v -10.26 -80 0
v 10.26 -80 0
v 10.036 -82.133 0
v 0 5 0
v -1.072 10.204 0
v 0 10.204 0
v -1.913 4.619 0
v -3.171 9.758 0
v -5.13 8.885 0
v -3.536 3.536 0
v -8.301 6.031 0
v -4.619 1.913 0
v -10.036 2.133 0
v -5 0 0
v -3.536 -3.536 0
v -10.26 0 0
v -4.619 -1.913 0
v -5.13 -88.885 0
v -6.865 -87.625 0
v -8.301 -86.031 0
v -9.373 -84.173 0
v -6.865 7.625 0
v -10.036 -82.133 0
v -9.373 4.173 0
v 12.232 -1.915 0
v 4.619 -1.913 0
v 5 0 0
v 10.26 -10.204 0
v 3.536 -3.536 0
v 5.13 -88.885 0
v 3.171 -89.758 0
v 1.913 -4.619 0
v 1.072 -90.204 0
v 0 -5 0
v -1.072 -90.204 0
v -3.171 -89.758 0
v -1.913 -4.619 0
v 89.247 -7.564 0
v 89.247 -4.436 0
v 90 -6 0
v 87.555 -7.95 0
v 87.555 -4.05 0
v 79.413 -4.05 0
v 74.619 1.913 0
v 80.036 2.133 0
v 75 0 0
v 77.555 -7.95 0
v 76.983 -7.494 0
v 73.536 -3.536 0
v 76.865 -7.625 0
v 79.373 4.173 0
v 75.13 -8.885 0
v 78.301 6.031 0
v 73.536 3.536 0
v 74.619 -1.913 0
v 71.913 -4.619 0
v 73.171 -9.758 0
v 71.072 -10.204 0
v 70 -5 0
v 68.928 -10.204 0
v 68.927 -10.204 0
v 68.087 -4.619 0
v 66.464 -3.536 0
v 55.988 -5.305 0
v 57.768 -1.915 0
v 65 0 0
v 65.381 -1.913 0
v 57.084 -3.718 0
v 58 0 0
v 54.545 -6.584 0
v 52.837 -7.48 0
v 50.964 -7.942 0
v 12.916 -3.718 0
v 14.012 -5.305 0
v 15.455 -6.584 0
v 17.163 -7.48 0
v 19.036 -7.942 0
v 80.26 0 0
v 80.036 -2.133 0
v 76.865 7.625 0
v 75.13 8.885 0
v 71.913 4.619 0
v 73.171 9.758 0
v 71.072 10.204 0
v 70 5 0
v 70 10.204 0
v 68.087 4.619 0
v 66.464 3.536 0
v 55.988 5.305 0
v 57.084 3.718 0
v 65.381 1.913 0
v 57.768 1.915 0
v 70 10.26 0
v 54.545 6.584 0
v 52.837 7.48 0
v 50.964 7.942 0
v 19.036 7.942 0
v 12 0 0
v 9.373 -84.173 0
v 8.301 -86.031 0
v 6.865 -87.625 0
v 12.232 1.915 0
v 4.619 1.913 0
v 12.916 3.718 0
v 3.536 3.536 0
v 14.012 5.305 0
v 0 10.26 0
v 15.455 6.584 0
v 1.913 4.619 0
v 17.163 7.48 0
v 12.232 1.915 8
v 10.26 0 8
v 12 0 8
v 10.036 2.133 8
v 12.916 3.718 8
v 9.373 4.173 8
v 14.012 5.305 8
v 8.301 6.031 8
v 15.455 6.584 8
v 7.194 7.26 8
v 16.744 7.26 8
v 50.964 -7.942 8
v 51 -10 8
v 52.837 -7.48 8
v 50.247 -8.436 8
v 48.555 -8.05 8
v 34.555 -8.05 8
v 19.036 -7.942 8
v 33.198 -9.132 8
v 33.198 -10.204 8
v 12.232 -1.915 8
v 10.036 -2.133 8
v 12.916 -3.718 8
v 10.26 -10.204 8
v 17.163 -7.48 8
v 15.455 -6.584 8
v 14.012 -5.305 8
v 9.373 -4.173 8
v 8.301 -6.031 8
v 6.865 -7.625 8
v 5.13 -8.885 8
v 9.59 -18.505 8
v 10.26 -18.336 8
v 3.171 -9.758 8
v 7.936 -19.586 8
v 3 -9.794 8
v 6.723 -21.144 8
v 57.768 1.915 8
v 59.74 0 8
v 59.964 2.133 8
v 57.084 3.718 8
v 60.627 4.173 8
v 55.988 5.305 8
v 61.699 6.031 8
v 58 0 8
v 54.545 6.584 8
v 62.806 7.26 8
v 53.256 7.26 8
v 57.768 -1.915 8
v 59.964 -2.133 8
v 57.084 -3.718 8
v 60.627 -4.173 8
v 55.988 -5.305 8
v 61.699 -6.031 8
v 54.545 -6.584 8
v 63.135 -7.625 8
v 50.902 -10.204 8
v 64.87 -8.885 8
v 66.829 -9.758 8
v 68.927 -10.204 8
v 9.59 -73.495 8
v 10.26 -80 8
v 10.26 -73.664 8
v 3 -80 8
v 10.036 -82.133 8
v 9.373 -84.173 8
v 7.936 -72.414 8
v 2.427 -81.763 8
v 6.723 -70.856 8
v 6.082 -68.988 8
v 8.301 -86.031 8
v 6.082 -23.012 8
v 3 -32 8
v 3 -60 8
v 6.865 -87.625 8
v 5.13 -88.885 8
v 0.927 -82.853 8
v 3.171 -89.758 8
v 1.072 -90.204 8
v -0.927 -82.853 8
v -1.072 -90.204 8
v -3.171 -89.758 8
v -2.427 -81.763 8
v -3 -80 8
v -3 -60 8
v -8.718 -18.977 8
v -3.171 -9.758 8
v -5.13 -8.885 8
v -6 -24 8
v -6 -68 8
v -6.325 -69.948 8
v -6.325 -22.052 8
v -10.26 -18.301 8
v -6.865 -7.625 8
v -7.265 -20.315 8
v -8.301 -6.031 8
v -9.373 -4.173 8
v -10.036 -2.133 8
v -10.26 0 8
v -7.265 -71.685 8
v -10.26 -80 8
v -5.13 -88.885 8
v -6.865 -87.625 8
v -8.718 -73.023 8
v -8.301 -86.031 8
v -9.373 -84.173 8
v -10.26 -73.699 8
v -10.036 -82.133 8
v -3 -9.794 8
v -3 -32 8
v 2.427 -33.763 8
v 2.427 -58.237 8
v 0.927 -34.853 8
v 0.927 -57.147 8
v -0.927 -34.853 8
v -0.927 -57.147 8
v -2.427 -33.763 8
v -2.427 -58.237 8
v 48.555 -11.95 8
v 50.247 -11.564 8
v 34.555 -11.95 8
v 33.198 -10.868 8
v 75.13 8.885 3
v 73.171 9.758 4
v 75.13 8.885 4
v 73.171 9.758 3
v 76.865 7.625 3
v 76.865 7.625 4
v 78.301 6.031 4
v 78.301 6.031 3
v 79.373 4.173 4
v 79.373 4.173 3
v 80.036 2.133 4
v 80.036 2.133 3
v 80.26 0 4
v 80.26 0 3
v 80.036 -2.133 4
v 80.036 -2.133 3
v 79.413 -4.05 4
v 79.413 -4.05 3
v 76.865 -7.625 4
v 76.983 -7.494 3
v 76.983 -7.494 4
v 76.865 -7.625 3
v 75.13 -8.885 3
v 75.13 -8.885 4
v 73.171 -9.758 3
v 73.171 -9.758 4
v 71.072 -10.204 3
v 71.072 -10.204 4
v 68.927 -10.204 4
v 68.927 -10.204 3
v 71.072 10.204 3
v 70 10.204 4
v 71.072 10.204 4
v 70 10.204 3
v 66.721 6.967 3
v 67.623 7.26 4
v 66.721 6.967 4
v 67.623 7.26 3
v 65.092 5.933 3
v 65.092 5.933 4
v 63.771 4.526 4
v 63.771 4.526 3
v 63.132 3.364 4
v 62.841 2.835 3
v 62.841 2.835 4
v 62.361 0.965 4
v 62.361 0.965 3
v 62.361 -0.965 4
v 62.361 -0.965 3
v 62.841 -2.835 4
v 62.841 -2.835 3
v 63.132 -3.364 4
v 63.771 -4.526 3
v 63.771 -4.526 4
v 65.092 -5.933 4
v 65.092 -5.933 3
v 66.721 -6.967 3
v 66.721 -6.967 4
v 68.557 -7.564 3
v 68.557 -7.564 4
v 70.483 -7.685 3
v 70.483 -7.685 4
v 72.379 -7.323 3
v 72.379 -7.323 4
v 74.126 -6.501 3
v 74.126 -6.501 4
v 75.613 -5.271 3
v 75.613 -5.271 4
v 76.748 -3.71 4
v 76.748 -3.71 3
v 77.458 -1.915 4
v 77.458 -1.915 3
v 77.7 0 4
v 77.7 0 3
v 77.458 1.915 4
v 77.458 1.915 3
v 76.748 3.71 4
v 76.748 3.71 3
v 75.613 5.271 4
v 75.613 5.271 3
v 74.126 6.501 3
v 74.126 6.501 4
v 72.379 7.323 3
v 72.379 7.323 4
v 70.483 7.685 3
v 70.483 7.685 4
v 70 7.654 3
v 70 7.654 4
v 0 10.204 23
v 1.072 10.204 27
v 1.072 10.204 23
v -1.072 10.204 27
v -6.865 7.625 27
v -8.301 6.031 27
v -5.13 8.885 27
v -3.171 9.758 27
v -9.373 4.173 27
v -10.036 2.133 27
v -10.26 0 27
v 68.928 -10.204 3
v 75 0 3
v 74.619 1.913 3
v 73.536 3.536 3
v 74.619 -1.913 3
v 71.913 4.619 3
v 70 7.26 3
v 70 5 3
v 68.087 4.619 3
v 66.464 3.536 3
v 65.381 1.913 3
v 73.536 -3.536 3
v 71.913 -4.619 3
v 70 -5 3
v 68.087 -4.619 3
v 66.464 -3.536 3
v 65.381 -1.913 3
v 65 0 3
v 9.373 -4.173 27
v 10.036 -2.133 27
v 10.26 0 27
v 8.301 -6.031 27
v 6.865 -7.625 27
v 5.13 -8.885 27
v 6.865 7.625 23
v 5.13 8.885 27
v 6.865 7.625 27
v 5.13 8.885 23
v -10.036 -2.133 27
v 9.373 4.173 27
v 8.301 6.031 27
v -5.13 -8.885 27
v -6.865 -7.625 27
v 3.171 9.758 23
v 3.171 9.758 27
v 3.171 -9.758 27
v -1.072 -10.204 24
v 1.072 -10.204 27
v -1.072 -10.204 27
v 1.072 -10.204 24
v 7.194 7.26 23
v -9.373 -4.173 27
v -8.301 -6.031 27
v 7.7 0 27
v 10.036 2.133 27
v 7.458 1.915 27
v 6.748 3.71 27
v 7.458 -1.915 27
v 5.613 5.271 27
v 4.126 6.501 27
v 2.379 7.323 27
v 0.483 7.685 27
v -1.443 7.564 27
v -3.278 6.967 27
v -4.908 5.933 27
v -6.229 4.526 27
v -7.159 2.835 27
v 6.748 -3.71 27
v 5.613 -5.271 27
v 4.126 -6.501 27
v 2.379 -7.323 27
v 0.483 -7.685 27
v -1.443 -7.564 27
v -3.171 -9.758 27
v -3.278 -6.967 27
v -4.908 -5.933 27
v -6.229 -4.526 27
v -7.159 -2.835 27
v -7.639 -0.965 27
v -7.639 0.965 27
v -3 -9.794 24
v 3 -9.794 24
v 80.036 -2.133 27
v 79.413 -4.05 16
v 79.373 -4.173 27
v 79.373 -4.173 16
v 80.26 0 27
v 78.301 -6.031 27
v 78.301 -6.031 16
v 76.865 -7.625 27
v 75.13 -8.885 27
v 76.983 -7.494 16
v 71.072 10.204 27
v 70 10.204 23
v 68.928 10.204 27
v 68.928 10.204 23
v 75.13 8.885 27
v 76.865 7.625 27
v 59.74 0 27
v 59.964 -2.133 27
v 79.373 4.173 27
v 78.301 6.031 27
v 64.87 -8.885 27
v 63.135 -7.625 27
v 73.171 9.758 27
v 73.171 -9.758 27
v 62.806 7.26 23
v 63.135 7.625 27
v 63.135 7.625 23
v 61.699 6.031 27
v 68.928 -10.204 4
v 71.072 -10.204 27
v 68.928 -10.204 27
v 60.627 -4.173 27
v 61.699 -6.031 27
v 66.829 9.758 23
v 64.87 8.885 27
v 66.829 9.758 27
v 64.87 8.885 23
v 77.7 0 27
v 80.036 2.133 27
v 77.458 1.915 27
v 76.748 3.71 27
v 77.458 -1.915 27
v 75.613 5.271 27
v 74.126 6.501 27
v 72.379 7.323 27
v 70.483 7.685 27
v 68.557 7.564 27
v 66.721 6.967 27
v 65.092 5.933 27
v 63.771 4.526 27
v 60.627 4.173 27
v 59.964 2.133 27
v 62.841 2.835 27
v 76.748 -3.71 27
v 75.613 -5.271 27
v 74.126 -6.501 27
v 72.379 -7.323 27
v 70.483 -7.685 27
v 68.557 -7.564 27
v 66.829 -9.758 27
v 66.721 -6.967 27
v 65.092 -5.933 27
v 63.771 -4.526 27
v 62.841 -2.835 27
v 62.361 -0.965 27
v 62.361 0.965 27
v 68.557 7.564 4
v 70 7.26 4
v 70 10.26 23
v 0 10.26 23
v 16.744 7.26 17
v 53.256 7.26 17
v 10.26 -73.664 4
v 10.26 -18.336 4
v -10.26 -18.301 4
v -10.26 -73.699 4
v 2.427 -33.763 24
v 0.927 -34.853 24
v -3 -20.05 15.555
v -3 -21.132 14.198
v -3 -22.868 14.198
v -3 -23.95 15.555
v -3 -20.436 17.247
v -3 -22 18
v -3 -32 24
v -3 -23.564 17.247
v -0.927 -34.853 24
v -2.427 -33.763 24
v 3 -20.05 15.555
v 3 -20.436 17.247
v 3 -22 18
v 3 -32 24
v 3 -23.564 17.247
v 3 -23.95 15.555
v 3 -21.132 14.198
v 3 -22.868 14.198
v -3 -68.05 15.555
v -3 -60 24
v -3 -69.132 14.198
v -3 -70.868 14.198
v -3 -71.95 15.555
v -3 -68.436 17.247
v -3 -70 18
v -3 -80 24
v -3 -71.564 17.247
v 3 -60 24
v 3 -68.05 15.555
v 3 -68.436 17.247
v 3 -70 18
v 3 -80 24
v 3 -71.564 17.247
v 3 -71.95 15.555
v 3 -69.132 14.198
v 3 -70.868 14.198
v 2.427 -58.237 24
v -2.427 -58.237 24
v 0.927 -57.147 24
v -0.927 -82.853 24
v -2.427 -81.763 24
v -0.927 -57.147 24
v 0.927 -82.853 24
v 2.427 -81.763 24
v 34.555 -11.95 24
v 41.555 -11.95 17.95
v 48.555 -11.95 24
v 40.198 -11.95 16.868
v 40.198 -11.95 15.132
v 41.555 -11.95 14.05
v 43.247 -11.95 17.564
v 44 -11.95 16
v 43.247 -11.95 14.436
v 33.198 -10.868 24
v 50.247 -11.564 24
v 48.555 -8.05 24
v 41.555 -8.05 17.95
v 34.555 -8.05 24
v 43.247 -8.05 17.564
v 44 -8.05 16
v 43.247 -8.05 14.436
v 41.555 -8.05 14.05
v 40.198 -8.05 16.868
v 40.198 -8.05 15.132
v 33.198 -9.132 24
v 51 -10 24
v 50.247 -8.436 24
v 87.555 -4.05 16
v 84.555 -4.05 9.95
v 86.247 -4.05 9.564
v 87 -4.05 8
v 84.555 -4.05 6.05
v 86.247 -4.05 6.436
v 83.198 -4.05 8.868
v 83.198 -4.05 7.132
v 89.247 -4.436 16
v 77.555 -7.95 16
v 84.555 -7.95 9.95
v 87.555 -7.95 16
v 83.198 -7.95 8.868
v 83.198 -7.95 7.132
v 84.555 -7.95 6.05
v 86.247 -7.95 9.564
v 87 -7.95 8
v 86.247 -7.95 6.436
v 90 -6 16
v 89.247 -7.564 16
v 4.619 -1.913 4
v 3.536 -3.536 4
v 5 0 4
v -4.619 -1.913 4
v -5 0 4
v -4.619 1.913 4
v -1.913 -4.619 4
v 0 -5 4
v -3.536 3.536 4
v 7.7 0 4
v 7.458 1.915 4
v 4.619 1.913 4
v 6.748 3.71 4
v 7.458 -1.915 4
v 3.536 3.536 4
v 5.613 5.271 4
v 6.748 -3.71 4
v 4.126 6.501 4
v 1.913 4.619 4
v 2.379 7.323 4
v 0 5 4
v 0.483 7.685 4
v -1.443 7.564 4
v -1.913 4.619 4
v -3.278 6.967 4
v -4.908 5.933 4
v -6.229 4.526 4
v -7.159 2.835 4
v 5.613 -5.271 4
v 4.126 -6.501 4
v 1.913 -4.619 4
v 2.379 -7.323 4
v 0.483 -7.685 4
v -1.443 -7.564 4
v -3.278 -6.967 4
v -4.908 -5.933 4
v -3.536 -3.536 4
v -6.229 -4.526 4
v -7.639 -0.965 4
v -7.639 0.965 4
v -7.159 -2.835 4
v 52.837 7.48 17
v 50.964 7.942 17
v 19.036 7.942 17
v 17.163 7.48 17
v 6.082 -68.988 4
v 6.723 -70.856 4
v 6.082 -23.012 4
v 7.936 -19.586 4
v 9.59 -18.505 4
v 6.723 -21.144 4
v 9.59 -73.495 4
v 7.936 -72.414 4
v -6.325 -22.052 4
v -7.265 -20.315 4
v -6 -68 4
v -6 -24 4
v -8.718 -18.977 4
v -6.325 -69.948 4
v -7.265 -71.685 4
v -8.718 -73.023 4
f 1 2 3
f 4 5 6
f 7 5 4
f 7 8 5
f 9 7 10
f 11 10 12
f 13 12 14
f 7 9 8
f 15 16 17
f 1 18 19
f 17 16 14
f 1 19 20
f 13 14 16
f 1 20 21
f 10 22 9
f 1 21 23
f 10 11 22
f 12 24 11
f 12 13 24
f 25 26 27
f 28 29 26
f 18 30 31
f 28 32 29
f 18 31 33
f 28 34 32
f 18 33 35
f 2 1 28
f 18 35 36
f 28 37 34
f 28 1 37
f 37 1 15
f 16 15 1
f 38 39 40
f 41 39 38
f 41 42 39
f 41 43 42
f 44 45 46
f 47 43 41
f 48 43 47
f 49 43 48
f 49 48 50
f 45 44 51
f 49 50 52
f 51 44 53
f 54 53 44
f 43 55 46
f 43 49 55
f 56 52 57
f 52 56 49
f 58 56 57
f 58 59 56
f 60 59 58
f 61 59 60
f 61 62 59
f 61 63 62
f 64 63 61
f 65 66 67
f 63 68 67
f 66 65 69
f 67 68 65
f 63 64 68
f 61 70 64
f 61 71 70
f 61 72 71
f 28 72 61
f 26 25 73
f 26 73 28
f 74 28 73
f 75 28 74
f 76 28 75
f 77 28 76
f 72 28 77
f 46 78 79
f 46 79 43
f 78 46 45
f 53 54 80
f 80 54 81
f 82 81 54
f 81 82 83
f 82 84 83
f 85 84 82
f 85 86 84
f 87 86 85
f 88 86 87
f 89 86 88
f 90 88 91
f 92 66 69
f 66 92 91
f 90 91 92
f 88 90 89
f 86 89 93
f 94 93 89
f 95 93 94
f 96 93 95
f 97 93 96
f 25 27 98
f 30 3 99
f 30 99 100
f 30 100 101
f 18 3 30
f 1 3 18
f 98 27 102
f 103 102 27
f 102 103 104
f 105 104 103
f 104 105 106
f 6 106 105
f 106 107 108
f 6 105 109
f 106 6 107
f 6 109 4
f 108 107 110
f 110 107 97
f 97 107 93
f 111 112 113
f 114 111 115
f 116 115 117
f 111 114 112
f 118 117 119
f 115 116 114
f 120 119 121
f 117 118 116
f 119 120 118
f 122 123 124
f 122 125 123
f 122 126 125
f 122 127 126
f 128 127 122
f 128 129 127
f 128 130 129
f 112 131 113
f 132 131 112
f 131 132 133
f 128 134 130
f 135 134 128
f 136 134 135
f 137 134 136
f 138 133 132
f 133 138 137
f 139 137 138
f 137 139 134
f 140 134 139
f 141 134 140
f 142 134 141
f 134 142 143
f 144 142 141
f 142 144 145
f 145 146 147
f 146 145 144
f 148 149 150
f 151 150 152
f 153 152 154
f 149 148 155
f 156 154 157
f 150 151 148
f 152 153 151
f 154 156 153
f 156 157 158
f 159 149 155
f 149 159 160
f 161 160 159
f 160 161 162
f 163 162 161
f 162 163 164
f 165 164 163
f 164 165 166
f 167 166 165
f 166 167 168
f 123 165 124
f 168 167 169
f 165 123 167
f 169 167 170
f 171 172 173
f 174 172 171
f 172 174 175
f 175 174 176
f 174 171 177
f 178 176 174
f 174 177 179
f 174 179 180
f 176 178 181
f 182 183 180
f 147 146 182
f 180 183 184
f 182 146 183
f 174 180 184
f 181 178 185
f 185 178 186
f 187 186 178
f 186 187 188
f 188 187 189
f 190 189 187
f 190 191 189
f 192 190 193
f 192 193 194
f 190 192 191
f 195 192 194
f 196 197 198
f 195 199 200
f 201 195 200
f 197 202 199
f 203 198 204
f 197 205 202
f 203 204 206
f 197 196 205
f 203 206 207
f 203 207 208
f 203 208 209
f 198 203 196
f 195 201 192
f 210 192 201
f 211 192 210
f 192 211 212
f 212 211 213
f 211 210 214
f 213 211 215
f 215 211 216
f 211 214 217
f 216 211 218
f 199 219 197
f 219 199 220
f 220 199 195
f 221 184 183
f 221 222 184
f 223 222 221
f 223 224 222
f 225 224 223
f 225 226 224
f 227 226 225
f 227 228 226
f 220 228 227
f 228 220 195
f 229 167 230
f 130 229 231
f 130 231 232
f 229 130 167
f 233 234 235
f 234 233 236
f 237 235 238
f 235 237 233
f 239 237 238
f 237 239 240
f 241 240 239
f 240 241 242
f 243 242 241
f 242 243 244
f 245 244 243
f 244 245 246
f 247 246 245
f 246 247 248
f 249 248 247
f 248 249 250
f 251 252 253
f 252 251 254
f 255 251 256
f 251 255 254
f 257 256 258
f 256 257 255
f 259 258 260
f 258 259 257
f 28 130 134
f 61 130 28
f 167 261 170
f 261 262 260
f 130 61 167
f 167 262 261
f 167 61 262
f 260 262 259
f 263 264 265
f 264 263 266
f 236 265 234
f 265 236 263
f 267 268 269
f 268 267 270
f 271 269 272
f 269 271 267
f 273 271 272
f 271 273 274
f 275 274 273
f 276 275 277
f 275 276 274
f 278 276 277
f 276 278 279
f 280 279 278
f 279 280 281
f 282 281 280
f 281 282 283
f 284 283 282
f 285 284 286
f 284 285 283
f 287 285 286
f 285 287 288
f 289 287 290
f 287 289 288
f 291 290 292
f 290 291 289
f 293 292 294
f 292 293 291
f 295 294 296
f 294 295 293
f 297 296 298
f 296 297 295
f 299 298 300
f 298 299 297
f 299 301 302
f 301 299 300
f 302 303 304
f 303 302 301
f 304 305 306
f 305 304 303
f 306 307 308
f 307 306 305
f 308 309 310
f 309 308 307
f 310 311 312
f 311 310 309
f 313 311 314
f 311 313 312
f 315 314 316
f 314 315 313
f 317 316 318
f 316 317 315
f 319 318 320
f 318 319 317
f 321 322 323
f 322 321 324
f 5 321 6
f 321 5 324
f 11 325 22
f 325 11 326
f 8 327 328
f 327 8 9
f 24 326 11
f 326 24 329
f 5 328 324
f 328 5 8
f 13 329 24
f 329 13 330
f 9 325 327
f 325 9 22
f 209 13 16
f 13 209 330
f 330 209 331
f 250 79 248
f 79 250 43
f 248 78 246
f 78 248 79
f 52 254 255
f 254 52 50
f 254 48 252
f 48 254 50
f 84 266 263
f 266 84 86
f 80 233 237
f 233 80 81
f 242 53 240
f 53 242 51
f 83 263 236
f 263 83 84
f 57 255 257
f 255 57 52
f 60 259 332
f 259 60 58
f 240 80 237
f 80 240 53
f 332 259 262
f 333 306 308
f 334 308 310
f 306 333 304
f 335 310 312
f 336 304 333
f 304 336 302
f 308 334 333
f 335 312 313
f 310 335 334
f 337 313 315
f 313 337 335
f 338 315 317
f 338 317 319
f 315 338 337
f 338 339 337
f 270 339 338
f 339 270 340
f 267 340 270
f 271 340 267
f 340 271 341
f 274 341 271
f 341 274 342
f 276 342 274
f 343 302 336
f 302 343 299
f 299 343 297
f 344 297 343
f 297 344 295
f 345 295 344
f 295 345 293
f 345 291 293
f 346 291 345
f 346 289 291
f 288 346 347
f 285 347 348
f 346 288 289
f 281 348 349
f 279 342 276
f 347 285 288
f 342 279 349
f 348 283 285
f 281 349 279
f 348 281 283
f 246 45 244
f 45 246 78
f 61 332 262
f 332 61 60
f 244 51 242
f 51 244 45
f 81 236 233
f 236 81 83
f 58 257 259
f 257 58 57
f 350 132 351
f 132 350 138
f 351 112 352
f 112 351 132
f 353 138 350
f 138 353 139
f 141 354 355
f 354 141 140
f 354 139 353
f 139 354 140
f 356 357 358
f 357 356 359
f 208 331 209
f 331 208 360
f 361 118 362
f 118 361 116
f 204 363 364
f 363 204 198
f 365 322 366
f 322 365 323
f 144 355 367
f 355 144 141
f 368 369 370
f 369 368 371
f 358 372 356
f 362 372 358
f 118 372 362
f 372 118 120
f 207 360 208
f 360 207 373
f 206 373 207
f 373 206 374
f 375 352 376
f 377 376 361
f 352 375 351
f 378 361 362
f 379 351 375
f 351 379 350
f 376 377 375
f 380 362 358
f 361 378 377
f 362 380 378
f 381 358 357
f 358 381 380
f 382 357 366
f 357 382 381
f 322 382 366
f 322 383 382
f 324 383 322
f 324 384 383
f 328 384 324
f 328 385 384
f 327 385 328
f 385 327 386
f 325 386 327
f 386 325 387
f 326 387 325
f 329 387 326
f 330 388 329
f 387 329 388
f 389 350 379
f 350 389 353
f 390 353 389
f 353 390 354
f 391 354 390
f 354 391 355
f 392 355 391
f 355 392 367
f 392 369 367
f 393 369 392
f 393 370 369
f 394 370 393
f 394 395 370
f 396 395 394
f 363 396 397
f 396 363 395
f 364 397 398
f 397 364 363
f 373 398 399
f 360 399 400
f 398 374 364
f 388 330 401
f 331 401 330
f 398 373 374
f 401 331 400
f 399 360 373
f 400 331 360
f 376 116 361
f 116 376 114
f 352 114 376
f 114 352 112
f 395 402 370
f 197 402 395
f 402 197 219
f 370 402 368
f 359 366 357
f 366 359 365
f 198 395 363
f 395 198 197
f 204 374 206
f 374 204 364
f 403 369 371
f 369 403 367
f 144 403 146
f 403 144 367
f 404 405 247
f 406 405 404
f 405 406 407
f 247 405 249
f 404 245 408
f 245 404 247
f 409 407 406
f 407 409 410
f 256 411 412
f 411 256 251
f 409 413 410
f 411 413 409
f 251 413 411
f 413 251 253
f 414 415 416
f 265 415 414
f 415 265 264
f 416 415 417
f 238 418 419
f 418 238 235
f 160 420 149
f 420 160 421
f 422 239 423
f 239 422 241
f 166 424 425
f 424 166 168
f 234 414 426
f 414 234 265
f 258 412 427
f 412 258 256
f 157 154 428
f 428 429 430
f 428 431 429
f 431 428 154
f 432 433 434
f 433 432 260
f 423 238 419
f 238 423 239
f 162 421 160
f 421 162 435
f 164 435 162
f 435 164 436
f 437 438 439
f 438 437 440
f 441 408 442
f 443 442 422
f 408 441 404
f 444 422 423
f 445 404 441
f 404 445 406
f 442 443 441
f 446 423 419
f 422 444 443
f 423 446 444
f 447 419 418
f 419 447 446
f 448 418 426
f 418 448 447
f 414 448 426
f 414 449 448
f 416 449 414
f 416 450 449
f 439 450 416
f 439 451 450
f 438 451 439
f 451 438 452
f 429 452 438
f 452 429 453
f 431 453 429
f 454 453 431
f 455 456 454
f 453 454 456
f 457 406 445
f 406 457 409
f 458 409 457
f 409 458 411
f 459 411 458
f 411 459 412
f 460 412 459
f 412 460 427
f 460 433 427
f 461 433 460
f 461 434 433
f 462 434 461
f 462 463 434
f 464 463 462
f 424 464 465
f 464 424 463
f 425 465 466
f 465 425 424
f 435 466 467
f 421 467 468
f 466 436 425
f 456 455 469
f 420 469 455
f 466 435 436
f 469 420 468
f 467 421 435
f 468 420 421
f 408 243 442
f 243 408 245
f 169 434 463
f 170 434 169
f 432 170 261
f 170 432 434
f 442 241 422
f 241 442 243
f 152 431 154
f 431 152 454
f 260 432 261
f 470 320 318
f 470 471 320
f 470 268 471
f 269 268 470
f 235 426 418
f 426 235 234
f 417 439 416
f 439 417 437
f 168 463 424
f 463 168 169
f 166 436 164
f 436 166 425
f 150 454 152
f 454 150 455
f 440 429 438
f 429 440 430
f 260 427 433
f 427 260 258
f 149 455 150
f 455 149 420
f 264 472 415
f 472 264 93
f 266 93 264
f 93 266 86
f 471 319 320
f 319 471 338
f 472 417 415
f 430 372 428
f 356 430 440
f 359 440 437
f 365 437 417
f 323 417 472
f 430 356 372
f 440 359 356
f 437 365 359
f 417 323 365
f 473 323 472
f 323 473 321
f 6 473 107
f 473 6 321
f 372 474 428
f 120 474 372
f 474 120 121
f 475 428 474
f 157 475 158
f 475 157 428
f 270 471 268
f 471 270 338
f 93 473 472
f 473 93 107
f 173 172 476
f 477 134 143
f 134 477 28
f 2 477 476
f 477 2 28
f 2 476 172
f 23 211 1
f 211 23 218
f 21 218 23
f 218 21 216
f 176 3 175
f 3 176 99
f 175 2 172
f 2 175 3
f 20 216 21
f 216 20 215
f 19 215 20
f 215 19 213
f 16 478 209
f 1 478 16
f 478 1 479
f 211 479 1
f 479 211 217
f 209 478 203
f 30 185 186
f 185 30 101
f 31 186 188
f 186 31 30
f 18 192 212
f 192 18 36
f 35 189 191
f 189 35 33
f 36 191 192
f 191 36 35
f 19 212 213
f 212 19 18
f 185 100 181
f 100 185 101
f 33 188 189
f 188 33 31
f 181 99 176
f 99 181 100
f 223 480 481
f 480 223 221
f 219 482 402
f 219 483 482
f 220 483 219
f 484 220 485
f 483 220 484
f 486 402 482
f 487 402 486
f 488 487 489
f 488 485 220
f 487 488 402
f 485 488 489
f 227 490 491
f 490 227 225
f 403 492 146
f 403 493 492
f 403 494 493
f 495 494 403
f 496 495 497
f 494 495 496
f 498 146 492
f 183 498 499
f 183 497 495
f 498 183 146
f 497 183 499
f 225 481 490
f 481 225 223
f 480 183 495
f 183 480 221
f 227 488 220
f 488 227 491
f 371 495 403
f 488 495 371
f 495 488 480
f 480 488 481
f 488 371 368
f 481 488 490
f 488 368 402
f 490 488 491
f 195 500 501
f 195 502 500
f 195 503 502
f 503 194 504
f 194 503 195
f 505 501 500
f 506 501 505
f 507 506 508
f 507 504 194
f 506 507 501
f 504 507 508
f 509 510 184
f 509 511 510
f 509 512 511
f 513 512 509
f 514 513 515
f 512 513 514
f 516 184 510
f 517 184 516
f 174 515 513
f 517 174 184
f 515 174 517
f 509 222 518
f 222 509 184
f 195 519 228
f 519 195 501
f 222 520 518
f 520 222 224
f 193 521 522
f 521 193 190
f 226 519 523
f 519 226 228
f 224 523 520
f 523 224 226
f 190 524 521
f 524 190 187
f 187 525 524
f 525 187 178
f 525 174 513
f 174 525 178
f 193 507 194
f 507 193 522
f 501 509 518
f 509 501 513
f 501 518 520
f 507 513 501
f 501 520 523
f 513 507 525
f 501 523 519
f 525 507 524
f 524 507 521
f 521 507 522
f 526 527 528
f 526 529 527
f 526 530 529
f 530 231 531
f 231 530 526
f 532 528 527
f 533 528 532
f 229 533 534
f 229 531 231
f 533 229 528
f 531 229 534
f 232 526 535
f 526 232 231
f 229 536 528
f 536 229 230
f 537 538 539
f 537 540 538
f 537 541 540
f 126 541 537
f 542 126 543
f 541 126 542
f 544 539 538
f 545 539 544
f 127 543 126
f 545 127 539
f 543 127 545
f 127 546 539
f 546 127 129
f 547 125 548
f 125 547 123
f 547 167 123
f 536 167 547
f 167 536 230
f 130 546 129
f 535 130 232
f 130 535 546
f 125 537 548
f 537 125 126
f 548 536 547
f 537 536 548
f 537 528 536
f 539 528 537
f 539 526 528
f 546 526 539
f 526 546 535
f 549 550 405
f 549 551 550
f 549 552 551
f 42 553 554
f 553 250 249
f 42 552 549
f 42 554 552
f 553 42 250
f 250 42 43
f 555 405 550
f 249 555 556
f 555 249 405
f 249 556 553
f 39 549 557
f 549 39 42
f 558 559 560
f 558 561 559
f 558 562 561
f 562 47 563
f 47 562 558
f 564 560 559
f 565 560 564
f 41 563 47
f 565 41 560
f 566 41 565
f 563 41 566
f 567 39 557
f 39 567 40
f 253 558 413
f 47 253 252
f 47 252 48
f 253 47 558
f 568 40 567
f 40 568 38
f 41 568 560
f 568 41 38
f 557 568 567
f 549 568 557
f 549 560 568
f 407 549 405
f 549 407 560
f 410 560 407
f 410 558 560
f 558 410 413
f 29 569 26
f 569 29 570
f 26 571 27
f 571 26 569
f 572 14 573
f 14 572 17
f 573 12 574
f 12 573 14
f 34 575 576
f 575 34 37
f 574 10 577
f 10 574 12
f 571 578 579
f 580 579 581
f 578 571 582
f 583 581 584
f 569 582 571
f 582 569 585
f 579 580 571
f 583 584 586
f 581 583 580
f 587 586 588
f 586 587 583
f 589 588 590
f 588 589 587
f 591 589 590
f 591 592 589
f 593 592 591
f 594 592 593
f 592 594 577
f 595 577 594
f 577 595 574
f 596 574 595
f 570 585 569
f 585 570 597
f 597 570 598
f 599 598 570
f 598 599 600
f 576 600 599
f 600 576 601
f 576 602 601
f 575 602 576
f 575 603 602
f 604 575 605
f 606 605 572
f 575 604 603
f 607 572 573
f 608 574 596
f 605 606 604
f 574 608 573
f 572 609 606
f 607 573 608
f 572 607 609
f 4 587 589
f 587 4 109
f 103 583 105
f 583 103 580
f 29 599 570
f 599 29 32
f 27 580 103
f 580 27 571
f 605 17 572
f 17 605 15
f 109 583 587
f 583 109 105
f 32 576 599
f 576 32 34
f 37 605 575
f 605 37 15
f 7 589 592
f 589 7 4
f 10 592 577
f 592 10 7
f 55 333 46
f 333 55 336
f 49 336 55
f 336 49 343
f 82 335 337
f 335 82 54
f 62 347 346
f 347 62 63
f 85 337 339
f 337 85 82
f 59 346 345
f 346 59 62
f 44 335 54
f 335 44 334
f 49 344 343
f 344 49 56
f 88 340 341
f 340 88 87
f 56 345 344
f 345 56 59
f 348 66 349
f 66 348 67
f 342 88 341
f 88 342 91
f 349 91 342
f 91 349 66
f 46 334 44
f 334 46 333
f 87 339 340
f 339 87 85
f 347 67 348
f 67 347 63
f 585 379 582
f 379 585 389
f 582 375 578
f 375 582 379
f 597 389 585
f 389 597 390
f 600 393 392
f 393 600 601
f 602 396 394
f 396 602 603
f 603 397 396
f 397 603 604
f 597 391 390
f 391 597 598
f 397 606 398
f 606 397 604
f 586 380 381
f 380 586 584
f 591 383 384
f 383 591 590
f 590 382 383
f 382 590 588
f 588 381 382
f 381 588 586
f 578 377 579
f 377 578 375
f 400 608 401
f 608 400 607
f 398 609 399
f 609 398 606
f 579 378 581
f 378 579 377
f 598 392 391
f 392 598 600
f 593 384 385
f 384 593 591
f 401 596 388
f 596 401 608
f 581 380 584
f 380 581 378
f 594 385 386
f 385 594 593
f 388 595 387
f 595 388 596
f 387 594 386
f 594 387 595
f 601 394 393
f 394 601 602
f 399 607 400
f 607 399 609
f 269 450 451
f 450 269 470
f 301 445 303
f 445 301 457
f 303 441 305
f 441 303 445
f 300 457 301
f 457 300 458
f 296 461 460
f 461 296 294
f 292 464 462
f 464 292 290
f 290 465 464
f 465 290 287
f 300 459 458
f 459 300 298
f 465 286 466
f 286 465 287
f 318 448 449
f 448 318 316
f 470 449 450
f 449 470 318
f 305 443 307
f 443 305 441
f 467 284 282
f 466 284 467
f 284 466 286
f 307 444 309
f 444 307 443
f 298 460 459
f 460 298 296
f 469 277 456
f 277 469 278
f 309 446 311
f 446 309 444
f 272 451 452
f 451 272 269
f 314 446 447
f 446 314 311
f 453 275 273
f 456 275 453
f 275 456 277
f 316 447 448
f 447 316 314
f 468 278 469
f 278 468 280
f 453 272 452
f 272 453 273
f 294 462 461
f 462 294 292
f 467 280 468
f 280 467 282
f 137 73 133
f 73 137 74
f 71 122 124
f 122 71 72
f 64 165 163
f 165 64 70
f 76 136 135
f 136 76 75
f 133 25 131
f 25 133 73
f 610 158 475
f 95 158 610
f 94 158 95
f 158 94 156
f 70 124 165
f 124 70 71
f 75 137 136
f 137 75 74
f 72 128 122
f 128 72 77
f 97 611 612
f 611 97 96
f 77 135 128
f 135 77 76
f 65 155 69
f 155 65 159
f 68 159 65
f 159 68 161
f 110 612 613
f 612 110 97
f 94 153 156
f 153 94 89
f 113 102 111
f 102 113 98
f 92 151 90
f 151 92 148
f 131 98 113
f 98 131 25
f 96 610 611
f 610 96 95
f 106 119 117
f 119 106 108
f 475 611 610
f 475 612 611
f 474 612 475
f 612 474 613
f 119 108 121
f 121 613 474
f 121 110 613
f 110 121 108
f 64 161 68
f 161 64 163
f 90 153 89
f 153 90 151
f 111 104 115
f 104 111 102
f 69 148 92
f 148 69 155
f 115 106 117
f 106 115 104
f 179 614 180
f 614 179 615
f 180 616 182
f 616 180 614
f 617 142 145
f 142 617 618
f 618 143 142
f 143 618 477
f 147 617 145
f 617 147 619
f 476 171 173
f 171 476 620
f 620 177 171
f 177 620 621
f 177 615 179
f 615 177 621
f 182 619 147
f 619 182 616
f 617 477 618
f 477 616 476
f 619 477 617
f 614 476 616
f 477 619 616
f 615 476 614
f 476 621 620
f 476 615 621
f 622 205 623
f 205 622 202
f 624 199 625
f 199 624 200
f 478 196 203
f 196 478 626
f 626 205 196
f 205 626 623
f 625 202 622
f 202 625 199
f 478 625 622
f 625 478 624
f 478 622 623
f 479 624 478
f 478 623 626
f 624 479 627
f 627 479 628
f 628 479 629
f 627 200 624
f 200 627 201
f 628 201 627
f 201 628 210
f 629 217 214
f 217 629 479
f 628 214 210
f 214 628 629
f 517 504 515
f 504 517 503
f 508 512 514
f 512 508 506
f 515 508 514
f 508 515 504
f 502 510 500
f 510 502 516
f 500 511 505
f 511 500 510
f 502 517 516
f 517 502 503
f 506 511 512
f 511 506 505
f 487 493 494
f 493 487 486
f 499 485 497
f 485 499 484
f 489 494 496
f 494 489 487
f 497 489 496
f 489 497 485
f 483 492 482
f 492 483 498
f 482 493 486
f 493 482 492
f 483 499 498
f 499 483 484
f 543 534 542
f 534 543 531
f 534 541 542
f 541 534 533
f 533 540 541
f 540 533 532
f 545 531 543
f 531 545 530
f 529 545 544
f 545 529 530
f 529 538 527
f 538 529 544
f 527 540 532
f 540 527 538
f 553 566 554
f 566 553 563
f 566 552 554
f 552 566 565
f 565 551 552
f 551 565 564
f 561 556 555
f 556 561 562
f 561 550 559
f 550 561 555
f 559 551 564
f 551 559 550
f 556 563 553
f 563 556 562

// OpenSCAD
// file: configuration.scad
rod_radius = 6.0;
frame_rod_radius = 4.0;
z_threaded_rod_radius = 4.0;

y_rod_height = 70;
x_rod_spacing = 70;

bearing_radius = 11; 					// 608 bearing

//  LM8 = 7.5  LM10 = 9.5  LM12 = 10.5
linear_bearing_radius =  7.6;  // LM8 + some extra space

z_threaded_to_smooth_spacing = 30;   // 30mm is OK for 8mm rods 
x_end_threaded_rod_height = 20;
// main file
include <configuration.scad>

bearing_r = linear_bearing_radius + 0.1;

extr_shelf_arm_length = 80;
extr_shelf_arm_height = 8;
extr_shelf_height = 16;
extr_shelf_length_a = 32;
extr_shelf_length_b = 46;

mirror([0,1,0]){
	x_arm_v2();
}



module x_arm_v2(){

	arm_end_radius = linear_bearing_radius * 1.35;

	difference(){

		union(){

			arm(x_rod_spacing, arm_end_radius, bearing_r, 8);

			cylinder(r=arm_end_radius, h=3);
			translate([x_rod_spacing,0, 0])
				cylinder(r=arm_end_radius, h=3);

			translate([0, 0, 4])
				cylinder(r=arm_end_radius, h=23);
			translate([x_rod_spacing,0, 4])
				cylinder(r=arm_end_radius, h=23);

			translate([0, -arm_end_radius, 0])
				cube([x_rod_spacing, 3, 23]);
			
			hull(){

				translate([0, 0, 0])
					cylinder(r=arm_end_radius, h=extr_shelf_arm_height);
				translate([0,extr_shelf_arm_length, 0])
					cylinder(r=arm_end_radius, h=extr_shelf_arm_height);


			}

			hull(){

				translate([0, 0, extr_shelf_arm_height])
					cylinder(r=3, h=extr_shelf_height);
				translate([0,extr_shelf_length_a, extr_shelf_arm_height])
					cylinder(r=3, h=extr_shelf_height);


			}


			hull(){

				translate([0, extr_shelf_arm_length - 20, extr_shelf_arm_height])
					cylinder(r=3, h=extr_shelf_height);
				translate([0, extr_shelf_arm_length, extr_shelf_arm_height])
					cylinder(r=3, h=extr_shelf_height);


			}


			// belt clamp mount
			hull(){

				translate([x_rod_spacing / 2, 10, extr_shelf_arm_height])
					cylinder(r=2, h=extr_shelf_height);
				translate([x_rod_spacing / 2 + 14, 10, extr_shelf_arm_height])
					cylinder(r=2, h=extr_shelf_height);


			}

			// wiring clip
			hull(){

				translate([x_rod_spacing + 8, 6, 0])
					cylinder(r=2, h=extr_shelf_height);
				translate([x_rod_spacing + 18, 6, 0])
					cylinder(r=2, h=extr_shelf_height);


			}




		}
		
		translate([0,0,-1])
			cylinder(r=5, h=5);
		
		translate([x_rod_spacing,0,-1])
			cylinder(r=5, h=5);
	
		translate([0,0,4])
			#cylinder(r=bearing_r, h=25);
		
		translate([x_rod_spacing,0,4])
			#cylinder(r=bearing_r, h=25);


		#hull(){	
			translate([20, 0, -1])
				cylinder(r=8, h=18);
	
			translate([x_rod_spacing - 20,  0, -1])
				cylinder(r=8, h=18);
		}


		#hull(){	
			translate([12, 24, 4])
				cylinder(r=6, h=8);
	
			translate([12, extr_shelf_arm_length - 12, 4])
				cylinder(r=6, h=8);
		}


		#hull(){	
			translate([-12, 24, 4])
				cylinder(r=6, h=8);
	
			translate([-12, extr_shelf_arm_length - 12, 4])
				cylinder(r=6, h=8);
		}

		// M3 holes for plate
			translate([6, extr_shelf_arm_length - 10, 16])
				rotate([0,-90,0])
					#cylinder(r=2, h=10);
			
			translate([6, 22, 16])
				rotate([0,-90,0])
					#cylinder(r=2, h=10);
	

		// M3 hole for belt mount
			translate([x_rod_spacing / 2 + 7, 4, 16])
				rotate([-90,0,0])
					#cylinder(r=2, h=10);
		
		// M3 hole for wiring clip
			translate([x_rod_spacing + 15, 4, 8])
				rotate([-90,0,0])
					#cylinder(r=2, h=10);


	}

}


module arm(length, radius, hole_radius, height){
	
	linear_extrude(height=height){

		difference(){

			hull(){
		
				circle(r=radius);
				translate([length, 0])
					circle(r=radius);
			}	
	

			union(){
	
				circle(r=hole_radius);
				translate([length, 0])
					circle(r=hole_radius);
			

			}
		}
	}

}
